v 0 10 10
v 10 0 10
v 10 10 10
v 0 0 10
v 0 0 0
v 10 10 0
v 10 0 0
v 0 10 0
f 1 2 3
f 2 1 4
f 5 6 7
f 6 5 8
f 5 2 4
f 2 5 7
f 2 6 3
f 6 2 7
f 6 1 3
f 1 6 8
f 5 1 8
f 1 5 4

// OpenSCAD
module cubeDefault(size) { cube([size, size, size]); } cubeDefault(size=10);
